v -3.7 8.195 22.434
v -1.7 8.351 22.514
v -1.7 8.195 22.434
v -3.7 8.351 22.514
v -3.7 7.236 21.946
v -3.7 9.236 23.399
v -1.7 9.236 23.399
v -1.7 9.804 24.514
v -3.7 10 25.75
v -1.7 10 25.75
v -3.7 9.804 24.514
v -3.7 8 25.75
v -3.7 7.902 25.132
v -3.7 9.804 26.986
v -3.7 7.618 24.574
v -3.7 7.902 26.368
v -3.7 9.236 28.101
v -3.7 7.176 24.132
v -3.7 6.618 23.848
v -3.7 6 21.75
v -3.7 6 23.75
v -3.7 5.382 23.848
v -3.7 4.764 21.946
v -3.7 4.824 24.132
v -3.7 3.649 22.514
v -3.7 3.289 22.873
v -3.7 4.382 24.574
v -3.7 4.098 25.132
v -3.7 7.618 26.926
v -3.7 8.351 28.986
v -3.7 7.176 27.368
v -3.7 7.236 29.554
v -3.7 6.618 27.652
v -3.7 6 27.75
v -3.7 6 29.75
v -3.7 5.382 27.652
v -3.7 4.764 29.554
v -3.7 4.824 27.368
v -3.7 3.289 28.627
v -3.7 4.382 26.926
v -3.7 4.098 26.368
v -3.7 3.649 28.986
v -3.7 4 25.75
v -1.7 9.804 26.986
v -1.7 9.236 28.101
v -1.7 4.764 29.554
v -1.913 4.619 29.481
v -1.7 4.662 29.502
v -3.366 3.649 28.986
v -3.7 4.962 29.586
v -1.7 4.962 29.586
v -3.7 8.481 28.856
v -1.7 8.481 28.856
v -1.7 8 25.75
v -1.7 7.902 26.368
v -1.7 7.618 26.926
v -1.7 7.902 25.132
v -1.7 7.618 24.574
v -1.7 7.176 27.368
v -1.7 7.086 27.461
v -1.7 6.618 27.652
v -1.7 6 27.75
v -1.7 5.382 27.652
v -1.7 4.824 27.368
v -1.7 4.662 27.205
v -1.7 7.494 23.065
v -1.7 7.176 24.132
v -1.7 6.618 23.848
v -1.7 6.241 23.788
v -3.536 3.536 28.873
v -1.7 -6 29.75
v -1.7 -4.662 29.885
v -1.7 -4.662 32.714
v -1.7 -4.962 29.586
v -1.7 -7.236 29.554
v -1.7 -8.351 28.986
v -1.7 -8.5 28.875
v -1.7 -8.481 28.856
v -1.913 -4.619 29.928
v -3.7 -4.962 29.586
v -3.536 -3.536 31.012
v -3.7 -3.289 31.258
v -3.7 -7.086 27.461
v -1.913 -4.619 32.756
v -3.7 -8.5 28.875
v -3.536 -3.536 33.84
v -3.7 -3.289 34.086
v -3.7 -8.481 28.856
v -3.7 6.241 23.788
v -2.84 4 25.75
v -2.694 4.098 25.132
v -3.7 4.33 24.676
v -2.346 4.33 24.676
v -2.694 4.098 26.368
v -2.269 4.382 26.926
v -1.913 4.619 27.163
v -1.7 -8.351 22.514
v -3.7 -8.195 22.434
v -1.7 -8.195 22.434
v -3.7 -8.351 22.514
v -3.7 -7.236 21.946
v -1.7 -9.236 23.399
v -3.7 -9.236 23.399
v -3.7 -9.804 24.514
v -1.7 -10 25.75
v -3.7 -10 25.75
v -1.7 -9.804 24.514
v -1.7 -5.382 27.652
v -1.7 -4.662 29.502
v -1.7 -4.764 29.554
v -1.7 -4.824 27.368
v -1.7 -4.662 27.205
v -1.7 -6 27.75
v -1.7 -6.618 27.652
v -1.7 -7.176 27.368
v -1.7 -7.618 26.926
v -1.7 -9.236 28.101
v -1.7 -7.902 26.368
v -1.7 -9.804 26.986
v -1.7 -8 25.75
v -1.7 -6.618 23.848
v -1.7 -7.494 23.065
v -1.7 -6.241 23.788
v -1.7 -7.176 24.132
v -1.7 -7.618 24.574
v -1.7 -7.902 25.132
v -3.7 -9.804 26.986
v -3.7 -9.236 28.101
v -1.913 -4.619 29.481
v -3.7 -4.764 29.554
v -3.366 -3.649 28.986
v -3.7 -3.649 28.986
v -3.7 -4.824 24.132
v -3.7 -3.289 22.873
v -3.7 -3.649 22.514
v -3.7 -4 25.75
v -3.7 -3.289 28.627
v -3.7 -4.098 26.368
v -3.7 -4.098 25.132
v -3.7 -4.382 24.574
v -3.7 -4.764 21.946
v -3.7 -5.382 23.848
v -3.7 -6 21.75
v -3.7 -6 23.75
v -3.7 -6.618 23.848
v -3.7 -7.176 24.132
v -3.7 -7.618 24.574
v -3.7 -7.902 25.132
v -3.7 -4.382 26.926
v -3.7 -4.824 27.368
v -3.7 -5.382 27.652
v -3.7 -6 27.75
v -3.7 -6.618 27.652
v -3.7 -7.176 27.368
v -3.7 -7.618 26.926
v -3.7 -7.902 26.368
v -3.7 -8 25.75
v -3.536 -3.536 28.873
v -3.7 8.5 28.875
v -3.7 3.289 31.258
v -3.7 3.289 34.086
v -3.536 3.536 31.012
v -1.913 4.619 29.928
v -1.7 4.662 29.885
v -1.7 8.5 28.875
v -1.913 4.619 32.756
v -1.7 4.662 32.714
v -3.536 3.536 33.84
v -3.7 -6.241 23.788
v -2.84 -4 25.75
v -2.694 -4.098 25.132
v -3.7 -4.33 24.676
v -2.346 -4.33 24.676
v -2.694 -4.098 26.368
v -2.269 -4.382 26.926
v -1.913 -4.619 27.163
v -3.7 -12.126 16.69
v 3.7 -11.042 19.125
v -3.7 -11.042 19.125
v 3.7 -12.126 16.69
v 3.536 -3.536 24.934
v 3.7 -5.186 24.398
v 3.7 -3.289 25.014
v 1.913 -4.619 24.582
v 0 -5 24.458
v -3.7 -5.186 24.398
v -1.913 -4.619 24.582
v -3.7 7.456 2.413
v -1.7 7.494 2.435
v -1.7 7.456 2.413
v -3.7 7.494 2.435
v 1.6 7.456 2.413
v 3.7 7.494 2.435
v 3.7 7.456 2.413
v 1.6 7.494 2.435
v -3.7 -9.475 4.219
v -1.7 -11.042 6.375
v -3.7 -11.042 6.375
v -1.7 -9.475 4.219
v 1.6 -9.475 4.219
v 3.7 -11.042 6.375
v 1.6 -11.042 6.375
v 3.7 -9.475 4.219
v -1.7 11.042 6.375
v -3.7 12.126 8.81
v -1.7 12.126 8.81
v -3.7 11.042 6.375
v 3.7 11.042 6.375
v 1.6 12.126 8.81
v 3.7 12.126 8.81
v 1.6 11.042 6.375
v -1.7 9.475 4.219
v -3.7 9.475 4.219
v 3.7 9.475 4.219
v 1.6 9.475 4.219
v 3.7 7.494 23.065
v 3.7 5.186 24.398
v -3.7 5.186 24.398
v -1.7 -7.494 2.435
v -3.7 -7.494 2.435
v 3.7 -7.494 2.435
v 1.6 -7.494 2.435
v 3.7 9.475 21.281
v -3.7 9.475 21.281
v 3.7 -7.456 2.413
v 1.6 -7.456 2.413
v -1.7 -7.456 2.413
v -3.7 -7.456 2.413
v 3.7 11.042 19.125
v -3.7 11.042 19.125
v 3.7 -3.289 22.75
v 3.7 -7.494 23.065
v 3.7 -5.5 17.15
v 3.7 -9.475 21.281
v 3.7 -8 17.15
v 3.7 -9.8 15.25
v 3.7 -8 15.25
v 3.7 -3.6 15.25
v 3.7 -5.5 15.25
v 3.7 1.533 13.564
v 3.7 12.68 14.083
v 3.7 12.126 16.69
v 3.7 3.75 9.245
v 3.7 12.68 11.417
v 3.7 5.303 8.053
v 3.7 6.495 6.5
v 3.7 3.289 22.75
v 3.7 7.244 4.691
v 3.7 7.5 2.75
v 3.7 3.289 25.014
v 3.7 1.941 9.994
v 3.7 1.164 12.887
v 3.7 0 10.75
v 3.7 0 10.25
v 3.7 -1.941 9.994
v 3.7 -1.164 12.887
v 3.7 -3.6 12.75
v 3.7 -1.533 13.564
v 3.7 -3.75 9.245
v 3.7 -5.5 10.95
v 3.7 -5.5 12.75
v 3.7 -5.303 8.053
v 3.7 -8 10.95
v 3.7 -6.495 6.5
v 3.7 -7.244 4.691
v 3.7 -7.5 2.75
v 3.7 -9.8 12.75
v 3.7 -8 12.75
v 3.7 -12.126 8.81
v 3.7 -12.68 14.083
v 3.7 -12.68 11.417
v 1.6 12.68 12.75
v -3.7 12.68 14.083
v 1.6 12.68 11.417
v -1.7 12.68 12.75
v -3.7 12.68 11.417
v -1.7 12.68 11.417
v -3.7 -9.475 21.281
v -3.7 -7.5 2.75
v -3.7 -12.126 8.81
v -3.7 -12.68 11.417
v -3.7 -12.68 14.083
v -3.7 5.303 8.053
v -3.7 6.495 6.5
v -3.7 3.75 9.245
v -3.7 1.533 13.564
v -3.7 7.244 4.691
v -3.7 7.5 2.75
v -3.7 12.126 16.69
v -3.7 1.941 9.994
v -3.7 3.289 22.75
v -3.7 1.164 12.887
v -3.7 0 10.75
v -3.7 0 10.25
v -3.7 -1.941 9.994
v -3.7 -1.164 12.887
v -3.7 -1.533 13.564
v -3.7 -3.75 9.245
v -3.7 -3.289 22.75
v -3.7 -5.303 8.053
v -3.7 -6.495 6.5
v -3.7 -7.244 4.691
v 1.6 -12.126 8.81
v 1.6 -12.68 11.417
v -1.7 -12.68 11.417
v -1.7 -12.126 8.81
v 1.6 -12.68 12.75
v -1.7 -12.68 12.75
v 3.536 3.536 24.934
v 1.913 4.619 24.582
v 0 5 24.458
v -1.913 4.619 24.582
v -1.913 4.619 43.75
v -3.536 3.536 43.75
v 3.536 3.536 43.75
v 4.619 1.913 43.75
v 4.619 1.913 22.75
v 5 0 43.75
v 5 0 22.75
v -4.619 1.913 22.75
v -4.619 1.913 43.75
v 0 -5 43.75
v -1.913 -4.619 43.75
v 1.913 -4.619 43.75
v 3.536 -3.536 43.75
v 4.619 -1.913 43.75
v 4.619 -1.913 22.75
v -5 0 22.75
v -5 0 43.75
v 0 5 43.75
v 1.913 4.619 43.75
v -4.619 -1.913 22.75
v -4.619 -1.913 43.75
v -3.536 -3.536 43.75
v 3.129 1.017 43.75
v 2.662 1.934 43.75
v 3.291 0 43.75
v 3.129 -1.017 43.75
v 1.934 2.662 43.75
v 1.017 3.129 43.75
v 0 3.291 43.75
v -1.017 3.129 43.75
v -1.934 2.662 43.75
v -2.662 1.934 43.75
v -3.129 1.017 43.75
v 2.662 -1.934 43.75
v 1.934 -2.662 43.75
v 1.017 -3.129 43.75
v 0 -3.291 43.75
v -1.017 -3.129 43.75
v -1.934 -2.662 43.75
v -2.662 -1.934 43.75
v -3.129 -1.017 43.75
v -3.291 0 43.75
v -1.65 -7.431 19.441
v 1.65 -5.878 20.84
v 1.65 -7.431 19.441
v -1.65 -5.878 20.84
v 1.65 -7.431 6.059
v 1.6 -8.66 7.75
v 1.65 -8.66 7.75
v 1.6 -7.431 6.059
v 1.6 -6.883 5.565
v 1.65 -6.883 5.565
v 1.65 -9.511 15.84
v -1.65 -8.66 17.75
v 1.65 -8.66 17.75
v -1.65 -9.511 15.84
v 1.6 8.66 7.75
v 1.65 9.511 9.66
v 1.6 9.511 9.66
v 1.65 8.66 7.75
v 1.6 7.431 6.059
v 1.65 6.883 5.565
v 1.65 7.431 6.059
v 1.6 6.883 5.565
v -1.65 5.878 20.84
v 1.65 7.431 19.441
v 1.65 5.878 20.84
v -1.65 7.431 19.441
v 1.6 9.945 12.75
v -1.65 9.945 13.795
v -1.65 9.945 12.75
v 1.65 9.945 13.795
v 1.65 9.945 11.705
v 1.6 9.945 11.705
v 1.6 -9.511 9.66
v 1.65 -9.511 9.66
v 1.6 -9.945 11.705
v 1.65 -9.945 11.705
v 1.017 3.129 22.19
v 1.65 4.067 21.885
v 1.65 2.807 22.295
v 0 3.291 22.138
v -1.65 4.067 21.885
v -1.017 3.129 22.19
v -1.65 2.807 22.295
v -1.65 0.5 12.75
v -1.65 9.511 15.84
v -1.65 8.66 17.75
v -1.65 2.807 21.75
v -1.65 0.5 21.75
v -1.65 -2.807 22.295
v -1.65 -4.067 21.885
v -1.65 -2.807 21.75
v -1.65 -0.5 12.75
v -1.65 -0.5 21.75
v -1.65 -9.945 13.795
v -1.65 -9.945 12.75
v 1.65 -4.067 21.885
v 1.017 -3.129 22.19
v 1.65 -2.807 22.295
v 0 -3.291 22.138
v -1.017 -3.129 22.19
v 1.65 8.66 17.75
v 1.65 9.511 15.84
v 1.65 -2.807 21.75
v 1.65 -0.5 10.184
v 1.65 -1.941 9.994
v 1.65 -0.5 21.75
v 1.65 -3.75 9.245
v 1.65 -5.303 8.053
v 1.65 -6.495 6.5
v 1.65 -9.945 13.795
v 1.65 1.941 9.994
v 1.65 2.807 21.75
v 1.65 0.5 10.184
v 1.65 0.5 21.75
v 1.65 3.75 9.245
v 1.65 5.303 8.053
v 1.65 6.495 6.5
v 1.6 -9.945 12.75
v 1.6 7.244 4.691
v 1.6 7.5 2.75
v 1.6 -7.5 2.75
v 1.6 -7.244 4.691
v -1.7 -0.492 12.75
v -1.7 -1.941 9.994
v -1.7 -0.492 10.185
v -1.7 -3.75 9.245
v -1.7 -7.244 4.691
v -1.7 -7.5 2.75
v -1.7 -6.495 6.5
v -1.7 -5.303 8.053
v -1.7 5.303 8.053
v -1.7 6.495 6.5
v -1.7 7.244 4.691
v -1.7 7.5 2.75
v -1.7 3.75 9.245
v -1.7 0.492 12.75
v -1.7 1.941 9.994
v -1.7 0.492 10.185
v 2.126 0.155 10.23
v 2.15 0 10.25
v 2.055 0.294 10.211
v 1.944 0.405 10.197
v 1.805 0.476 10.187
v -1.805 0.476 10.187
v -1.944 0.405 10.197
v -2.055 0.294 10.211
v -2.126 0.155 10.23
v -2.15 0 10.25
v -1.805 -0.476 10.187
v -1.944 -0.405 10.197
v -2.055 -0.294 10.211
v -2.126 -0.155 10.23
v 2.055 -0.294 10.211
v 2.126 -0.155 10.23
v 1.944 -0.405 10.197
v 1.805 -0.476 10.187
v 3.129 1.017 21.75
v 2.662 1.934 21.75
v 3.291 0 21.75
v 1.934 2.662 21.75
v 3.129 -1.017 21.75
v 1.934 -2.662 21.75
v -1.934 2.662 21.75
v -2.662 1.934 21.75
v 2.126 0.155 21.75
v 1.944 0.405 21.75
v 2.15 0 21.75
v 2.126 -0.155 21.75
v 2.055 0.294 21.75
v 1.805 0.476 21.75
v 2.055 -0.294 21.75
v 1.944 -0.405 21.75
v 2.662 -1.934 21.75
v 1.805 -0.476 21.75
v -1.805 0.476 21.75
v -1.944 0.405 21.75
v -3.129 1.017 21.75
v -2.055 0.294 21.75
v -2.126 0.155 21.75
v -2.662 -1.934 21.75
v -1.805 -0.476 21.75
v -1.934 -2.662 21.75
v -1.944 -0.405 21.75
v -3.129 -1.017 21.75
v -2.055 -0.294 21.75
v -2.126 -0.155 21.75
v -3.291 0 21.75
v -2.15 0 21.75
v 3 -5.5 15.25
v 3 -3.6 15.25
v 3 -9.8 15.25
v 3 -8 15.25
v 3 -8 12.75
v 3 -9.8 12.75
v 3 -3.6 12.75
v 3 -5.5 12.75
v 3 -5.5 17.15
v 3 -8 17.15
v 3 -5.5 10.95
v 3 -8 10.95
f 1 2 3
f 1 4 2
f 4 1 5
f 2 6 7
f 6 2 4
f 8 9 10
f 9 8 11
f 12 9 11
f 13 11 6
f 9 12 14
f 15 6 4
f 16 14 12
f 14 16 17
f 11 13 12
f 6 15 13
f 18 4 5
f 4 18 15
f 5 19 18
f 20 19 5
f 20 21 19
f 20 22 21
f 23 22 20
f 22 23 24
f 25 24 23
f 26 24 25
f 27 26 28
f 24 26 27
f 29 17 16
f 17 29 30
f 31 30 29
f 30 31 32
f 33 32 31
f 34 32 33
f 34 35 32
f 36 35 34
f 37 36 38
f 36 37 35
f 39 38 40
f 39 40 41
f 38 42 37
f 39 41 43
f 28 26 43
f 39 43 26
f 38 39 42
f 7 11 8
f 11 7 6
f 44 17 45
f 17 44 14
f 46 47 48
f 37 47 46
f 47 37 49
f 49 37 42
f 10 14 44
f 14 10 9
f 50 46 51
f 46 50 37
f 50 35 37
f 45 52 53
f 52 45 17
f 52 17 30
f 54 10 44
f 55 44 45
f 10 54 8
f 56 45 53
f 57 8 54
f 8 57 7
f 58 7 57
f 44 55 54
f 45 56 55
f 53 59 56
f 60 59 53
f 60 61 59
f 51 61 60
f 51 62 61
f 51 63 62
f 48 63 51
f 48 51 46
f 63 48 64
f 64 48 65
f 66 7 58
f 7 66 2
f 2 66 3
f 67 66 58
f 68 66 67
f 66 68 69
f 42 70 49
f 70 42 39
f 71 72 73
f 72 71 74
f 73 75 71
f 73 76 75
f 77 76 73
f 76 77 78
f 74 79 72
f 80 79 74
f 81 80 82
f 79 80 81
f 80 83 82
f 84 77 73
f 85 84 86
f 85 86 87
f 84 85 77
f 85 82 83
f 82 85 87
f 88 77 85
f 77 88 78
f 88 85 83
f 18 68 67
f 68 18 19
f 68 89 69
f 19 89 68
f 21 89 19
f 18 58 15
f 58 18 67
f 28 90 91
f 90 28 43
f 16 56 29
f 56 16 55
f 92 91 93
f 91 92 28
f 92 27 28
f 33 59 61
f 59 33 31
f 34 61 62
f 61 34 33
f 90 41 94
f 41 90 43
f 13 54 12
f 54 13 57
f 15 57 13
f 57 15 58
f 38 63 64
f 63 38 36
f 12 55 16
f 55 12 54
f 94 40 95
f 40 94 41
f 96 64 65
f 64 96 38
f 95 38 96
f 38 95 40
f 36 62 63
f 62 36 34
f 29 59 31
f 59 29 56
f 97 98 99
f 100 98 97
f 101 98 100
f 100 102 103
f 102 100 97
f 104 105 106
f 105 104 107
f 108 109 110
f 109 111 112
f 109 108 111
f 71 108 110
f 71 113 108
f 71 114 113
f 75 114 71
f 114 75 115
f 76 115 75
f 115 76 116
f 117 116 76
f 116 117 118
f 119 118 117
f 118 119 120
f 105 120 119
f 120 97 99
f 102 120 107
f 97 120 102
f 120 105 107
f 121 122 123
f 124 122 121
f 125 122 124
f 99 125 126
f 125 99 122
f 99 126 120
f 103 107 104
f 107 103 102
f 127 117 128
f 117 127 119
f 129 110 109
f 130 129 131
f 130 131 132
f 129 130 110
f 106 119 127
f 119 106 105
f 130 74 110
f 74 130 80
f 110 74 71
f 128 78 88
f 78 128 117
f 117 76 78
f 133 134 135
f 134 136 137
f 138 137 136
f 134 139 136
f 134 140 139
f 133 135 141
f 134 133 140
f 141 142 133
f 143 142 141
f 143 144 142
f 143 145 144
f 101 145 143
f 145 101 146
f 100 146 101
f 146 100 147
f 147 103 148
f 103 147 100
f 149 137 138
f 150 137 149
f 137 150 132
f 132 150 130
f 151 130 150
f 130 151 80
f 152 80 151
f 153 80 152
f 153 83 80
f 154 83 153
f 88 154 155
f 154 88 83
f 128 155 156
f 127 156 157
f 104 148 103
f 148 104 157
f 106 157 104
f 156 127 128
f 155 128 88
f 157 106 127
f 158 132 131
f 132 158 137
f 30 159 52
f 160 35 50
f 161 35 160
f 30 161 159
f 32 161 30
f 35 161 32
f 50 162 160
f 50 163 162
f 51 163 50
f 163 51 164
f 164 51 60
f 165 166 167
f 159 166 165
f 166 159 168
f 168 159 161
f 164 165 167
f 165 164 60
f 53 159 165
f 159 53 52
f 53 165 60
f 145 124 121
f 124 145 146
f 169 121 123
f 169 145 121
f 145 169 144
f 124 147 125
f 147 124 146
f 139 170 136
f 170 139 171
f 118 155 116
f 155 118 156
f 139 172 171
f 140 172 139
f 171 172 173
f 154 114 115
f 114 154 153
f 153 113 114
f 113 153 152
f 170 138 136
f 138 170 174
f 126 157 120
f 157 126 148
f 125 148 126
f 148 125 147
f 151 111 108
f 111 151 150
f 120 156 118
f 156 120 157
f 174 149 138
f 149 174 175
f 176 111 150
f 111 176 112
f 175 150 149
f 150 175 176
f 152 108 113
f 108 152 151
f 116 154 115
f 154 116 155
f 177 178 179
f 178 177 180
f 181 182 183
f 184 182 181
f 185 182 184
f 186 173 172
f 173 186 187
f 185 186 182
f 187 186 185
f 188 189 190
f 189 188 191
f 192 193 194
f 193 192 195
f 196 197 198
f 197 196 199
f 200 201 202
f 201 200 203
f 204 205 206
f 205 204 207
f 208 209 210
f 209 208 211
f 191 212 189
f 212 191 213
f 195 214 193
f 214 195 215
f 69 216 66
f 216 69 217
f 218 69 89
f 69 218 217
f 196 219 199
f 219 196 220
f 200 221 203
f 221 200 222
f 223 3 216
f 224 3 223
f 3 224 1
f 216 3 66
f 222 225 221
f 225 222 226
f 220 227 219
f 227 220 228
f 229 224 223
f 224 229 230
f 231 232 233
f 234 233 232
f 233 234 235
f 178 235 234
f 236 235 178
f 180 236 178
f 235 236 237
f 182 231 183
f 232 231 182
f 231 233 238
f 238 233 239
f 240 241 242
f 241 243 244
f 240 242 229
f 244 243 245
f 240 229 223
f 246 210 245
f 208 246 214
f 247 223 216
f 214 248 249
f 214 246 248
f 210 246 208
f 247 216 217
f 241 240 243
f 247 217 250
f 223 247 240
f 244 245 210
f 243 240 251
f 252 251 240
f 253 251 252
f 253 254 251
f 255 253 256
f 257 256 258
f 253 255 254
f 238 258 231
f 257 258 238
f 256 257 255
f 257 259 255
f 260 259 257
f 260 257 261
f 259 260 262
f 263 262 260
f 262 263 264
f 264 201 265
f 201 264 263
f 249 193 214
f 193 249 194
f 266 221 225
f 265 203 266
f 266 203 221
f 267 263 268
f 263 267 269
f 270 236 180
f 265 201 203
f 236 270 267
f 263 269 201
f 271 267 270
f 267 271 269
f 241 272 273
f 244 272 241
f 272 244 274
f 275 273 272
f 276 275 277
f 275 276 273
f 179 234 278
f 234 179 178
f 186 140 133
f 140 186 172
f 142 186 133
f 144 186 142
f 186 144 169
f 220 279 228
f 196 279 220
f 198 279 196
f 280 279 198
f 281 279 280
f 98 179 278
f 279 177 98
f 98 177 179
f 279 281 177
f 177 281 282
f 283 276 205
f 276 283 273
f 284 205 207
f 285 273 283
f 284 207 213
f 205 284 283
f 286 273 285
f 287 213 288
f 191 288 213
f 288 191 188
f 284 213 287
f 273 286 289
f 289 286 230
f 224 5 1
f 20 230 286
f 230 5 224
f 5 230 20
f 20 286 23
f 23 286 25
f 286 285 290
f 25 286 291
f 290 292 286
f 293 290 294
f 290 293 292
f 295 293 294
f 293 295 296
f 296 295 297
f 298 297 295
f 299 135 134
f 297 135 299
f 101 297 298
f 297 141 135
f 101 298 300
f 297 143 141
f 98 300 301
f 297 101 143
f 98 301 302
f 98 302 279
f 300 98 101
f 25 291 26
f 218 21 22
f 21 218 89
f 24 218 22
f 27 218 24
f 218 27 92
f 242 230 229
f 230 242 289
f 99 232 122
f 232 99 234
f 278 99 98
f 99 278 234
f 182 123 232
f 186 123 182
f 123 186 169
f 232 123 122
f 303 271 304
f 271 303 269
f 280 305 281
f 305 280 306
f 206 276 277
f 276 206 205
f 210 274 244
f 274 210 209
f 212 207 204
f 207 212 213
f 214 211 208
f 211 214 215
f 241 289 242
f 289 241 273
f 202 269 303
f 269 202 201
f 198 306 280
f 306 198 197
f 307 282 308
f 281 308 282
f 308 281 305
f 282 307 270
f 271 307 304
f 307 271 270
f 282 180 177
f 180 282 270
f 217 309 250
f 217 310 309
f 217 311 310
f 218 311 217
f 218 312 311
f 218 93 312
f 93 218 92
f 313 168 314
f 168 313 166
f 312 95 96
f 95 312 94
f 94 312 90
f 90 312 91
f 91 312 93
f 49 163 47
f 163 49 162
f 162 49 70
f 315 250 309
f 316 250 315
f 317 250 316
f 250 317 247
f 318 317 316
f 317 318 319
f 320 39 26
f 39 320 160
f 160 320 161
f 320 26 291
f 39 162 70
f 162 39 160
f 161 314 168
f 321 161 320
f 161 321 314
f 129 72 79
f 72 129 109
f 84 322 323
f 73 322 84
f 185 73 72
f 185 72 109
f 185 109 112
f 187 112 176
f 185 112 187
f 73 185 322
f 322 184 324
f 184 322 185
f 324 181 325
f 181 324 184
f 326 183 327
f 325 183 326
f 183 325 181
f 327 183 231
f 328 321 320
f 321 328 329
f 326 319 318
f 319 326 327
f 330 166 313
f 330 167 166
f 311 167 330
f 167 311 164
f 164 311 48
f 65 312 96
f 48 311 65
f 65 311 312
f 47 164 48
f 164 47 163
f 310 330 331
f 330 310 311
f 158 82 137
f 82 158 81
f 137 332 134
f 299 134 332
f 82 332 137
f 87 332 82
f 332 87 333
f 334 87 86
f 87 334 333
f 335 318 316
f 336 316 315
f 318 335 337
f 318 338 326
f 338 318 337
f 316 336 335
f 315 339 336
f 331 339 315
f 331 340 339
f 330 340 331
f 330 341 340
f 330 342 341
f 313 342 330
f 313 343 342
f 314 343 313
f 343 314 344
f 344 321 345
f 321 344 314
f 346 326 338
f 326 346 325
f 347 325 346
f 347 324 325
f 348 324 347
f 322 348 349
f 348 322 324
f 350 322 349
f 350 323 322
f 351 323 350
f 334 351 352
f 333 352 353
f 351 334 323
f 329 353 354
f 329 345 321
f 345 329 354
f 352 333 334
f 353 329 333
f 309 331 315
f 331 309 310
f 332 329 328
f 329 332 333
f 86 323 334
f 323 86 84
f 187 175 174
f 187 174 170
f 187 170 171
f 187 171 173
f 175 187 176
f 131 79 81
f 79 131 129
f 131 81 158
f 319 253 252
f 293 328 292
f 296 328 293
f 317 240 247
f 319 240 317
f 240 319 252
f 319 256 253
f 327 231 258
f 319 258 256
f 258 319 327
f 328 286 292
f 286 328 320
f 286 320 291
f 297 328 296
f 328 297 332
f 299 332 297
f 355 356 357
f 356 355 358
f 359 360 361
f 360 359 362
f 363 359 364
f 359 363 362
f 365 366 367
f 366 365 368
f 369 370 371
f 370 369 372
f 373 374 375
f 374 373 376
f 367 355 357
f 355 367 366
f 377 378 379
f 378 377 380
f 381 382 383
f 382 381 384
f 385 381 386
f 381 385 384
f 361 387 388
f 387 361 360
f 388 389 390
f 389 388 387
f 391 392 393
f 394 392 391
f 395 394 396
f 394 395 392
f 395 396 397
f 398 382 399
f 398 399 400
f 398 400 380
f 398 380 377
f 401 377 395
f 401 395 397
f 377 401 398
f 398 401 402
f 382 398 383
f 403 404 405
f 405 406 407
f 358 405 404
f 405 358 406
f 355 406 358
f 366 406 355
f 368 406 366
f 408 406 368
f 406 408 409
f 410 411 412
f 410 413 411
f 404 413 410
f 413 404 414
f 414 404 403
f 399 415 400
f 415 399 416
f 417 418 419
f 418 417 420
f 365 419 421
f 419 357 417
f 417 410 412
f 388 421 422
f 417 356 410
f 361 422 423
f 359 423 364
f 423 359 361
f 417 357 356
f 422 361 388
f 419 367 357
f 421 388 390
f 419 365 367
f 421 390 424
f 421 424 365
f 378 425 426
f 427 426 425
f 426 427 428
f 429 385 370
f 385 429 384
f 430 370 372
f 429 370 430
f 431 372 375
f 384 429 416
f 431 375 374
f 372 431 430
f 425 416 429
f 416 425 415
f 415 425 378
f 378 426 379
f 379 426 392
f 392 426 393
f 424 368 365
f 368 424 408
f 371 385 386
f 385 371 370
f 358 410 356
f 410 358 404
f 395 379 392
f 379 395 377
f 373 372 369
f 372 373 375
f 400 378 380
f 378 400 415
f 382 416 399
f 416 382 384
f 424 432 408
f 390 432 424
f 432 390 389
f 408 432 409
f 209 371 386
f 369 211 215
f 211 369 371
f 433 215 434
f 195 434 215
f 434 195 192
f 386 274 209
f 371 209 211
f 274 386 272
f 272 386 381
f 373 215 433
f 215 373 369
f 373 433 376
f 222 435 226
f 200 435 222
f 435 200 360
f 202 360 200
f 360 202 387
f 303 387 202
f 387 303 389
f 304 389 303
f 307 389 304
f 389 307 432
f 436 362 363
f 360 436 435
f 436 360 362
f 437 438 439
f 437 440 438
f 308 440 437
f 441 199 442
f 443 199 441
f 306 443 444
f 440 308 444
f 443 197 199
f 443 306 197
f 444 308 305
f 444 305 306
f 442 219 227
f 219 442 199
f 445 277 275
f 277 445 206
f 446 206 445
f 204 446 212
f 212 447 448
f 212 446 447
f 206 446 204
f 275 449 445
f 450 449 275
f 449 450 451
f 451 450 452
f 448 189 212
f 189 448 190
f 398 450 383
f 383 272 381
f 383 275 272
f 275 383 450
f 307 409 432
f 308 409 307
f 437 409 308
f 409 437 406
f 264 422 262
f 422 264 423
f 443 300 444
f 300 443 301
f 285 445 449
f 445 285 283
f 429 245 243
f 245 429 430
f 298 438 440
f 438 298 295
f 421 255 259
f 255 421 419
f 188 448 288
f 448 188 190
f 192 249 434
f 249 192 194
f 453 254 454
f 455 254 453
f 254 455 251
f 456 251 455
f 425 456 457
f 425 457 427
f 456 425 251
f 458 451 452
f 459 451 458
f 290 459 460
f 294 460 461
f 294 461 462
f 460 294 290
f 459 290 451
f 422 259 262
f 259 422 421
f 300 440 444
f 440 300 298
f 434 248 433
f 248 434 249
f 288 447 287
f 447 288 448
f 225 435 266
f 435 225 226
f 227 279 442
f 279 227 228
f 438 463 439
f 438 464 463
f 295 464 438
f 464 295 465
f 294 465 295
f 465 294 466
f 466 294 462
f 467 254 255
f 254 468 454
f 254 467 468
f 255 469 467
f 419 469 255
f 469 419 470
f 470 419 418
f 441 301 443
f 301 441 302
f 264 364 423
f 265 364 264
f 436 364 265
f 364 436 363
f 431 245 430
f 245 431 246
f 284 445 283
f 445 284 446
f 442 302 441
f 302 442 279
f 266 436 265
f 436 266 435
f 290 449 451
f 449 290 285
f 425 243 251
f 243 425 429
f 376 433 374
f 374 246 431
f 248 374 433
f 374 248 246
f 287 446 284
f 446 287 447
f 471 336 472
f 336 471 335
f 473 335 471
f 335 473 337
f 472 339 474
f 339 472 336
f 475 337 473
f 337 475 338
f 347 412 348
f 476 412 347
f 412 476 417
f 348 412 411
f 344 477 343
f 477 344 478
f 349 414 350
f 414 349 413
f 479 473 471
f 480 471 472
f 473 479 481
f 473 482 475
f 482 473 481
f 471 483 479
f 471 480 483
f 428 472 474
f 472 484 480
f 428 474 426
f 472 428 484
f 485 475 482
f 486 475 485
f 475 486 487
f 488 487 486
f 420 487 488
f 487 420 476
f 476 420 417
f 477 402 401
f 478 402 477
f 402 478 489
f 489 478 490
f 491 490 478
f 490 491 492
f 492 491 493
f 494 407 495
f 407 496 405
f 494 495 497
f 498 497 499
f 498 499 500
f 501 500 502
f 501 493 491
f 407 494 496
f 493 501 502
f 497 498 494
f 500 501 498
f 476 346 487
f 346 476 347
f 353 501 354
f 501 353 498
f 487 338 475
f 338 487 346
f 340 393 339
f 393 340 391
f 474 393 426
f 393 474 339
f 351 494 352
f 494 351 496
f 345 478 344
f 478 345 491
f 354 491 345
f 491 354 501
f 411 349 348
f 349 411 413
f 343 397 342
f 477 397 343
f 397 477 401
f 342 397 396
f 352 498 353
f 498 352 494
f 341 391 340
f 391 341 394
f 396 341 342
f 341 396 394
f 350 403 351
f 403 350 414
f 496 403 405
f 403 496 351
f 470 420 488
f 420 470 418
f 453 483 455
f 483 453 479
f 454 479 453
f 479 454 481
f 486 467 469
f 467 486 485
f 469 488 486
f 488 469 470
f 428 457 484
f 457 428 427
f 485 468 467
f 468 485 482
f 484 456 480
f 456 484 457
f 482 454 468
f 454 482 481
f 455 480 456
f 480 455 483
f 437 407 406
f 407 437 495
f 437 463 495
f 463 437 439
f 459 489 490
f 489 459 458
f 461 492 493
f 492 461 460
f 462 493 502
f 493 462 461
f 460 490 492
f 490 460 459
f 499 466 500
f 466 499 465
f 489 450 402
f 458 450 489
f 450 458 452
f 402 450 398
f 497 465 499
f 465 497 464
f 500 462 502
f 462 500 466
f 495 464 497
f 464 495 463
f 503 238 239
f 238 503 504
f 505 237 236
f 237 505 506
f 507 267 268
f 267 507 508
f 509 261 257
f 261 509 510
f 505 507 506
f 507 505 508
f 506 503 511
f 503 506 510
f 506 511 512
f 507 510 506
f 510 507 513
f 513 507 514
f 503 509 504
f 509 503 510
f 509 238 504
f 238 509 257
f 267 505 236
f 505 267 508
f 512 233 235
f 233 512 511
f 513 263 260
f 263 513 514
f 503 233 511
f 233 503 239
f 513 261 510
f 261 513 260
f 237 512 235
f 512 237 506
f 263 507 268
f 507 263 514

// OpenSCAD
/**
 * file: ledBatteryHolder.scad 
 * Make It, Wear It
 * Chapter 4: Fiber Optic Scarf
 * 
 * Print Settings:
 * Infill: 10%
 * Supports: No
 * Build Plate Adhession: Brim
 *
 * To Do:
 * [ ] Rotate 180° so it prints battery side up
 */
 
// Parametric Variables
// values are in mm that will be the default unit for printing
// LED width = 6mm, bundle width = 5.75 mm
innerDiameter = 3.25;
// LED = 8.2 mm tall, fiber optic bundle = 12.5
tubeLength = 21;

// The % operator makes the object transparent for debugging
// The '#' operator highlights the object

// module for circumscribed holes
module cylinder_outer(height,radius,fn) {
   fudge = 1/cos(180/fn);
   cylinder(h=height,r=radius*fudge,$fn=fn);
}

module sewing_tab() {
    difference() {
        union() {
            cylinder(2.0, 4.0, 4.0, $fn=20);
            translate([-3.1255, -14.5, 0])
            rotate([0,0,45])
            cube([2,7.5,2]);
        }
        translate([0, 0, -1])
        cylinder(4.0, 2.0, 2.0, $fn=20);
    }
}
 
translate([0, 0, 12.75])
difference() {
    // solids
    union() {
        // battery holder
        rotate([0,90,0]) {
            cylinder(7.4, 12.75, 12.75, true);
            // sewing tabs
            translate([-13, 6, -3.7])
            sewing_tab();
            // Another option might to use mirror()
            translate([-13, -6, -1.7])
            rotate([180,0,0])
            sewing_tab();
        }
        // LED tube
        translate([0, 0, 10])
        // LED = 8.2 mm tall, fiber optic bundle = 12.5
        cylinder(tubeLength, 5, 5, false);
        translate([0, 0, -2])
        cylinder(12, 3.7, 5, false);
    }
    // battery holder negative space
    rotate([0,90,0]) {
        cylinder(3.3, 10, 10, true);
        translate([0, -12.75, -1.7])
        cube([12.75,25.5,3.3]);
        translate([10, 0, 0])
        cylinder(7.5, 7.5, 7.5, true);
    }
    // LED tube negative space
    translate([0, 0, 9])
    // LED width = 6mm, bundle width = 5.75 mm
    //#cylinder(23, 3, 3, false, $fn=20);
    cylinder_outer(23, innerDiameter, 20);
    // LED leads negative space: 0.5mm diameter
    translate([1.65, 0, -4])
    cylinder(14, .5, .5, false, $fn=20);
    translate([-1.65, 0, -4])
    cylinder(14, .5, .5, false, $fn=20);
    // plus symbol negative space
    translate([3, -9.8, 0])
    cube([1, 6.2,2.5]);
    translate([3, -8, -1.8])
    cube([1,2.5,6.2]);
}
